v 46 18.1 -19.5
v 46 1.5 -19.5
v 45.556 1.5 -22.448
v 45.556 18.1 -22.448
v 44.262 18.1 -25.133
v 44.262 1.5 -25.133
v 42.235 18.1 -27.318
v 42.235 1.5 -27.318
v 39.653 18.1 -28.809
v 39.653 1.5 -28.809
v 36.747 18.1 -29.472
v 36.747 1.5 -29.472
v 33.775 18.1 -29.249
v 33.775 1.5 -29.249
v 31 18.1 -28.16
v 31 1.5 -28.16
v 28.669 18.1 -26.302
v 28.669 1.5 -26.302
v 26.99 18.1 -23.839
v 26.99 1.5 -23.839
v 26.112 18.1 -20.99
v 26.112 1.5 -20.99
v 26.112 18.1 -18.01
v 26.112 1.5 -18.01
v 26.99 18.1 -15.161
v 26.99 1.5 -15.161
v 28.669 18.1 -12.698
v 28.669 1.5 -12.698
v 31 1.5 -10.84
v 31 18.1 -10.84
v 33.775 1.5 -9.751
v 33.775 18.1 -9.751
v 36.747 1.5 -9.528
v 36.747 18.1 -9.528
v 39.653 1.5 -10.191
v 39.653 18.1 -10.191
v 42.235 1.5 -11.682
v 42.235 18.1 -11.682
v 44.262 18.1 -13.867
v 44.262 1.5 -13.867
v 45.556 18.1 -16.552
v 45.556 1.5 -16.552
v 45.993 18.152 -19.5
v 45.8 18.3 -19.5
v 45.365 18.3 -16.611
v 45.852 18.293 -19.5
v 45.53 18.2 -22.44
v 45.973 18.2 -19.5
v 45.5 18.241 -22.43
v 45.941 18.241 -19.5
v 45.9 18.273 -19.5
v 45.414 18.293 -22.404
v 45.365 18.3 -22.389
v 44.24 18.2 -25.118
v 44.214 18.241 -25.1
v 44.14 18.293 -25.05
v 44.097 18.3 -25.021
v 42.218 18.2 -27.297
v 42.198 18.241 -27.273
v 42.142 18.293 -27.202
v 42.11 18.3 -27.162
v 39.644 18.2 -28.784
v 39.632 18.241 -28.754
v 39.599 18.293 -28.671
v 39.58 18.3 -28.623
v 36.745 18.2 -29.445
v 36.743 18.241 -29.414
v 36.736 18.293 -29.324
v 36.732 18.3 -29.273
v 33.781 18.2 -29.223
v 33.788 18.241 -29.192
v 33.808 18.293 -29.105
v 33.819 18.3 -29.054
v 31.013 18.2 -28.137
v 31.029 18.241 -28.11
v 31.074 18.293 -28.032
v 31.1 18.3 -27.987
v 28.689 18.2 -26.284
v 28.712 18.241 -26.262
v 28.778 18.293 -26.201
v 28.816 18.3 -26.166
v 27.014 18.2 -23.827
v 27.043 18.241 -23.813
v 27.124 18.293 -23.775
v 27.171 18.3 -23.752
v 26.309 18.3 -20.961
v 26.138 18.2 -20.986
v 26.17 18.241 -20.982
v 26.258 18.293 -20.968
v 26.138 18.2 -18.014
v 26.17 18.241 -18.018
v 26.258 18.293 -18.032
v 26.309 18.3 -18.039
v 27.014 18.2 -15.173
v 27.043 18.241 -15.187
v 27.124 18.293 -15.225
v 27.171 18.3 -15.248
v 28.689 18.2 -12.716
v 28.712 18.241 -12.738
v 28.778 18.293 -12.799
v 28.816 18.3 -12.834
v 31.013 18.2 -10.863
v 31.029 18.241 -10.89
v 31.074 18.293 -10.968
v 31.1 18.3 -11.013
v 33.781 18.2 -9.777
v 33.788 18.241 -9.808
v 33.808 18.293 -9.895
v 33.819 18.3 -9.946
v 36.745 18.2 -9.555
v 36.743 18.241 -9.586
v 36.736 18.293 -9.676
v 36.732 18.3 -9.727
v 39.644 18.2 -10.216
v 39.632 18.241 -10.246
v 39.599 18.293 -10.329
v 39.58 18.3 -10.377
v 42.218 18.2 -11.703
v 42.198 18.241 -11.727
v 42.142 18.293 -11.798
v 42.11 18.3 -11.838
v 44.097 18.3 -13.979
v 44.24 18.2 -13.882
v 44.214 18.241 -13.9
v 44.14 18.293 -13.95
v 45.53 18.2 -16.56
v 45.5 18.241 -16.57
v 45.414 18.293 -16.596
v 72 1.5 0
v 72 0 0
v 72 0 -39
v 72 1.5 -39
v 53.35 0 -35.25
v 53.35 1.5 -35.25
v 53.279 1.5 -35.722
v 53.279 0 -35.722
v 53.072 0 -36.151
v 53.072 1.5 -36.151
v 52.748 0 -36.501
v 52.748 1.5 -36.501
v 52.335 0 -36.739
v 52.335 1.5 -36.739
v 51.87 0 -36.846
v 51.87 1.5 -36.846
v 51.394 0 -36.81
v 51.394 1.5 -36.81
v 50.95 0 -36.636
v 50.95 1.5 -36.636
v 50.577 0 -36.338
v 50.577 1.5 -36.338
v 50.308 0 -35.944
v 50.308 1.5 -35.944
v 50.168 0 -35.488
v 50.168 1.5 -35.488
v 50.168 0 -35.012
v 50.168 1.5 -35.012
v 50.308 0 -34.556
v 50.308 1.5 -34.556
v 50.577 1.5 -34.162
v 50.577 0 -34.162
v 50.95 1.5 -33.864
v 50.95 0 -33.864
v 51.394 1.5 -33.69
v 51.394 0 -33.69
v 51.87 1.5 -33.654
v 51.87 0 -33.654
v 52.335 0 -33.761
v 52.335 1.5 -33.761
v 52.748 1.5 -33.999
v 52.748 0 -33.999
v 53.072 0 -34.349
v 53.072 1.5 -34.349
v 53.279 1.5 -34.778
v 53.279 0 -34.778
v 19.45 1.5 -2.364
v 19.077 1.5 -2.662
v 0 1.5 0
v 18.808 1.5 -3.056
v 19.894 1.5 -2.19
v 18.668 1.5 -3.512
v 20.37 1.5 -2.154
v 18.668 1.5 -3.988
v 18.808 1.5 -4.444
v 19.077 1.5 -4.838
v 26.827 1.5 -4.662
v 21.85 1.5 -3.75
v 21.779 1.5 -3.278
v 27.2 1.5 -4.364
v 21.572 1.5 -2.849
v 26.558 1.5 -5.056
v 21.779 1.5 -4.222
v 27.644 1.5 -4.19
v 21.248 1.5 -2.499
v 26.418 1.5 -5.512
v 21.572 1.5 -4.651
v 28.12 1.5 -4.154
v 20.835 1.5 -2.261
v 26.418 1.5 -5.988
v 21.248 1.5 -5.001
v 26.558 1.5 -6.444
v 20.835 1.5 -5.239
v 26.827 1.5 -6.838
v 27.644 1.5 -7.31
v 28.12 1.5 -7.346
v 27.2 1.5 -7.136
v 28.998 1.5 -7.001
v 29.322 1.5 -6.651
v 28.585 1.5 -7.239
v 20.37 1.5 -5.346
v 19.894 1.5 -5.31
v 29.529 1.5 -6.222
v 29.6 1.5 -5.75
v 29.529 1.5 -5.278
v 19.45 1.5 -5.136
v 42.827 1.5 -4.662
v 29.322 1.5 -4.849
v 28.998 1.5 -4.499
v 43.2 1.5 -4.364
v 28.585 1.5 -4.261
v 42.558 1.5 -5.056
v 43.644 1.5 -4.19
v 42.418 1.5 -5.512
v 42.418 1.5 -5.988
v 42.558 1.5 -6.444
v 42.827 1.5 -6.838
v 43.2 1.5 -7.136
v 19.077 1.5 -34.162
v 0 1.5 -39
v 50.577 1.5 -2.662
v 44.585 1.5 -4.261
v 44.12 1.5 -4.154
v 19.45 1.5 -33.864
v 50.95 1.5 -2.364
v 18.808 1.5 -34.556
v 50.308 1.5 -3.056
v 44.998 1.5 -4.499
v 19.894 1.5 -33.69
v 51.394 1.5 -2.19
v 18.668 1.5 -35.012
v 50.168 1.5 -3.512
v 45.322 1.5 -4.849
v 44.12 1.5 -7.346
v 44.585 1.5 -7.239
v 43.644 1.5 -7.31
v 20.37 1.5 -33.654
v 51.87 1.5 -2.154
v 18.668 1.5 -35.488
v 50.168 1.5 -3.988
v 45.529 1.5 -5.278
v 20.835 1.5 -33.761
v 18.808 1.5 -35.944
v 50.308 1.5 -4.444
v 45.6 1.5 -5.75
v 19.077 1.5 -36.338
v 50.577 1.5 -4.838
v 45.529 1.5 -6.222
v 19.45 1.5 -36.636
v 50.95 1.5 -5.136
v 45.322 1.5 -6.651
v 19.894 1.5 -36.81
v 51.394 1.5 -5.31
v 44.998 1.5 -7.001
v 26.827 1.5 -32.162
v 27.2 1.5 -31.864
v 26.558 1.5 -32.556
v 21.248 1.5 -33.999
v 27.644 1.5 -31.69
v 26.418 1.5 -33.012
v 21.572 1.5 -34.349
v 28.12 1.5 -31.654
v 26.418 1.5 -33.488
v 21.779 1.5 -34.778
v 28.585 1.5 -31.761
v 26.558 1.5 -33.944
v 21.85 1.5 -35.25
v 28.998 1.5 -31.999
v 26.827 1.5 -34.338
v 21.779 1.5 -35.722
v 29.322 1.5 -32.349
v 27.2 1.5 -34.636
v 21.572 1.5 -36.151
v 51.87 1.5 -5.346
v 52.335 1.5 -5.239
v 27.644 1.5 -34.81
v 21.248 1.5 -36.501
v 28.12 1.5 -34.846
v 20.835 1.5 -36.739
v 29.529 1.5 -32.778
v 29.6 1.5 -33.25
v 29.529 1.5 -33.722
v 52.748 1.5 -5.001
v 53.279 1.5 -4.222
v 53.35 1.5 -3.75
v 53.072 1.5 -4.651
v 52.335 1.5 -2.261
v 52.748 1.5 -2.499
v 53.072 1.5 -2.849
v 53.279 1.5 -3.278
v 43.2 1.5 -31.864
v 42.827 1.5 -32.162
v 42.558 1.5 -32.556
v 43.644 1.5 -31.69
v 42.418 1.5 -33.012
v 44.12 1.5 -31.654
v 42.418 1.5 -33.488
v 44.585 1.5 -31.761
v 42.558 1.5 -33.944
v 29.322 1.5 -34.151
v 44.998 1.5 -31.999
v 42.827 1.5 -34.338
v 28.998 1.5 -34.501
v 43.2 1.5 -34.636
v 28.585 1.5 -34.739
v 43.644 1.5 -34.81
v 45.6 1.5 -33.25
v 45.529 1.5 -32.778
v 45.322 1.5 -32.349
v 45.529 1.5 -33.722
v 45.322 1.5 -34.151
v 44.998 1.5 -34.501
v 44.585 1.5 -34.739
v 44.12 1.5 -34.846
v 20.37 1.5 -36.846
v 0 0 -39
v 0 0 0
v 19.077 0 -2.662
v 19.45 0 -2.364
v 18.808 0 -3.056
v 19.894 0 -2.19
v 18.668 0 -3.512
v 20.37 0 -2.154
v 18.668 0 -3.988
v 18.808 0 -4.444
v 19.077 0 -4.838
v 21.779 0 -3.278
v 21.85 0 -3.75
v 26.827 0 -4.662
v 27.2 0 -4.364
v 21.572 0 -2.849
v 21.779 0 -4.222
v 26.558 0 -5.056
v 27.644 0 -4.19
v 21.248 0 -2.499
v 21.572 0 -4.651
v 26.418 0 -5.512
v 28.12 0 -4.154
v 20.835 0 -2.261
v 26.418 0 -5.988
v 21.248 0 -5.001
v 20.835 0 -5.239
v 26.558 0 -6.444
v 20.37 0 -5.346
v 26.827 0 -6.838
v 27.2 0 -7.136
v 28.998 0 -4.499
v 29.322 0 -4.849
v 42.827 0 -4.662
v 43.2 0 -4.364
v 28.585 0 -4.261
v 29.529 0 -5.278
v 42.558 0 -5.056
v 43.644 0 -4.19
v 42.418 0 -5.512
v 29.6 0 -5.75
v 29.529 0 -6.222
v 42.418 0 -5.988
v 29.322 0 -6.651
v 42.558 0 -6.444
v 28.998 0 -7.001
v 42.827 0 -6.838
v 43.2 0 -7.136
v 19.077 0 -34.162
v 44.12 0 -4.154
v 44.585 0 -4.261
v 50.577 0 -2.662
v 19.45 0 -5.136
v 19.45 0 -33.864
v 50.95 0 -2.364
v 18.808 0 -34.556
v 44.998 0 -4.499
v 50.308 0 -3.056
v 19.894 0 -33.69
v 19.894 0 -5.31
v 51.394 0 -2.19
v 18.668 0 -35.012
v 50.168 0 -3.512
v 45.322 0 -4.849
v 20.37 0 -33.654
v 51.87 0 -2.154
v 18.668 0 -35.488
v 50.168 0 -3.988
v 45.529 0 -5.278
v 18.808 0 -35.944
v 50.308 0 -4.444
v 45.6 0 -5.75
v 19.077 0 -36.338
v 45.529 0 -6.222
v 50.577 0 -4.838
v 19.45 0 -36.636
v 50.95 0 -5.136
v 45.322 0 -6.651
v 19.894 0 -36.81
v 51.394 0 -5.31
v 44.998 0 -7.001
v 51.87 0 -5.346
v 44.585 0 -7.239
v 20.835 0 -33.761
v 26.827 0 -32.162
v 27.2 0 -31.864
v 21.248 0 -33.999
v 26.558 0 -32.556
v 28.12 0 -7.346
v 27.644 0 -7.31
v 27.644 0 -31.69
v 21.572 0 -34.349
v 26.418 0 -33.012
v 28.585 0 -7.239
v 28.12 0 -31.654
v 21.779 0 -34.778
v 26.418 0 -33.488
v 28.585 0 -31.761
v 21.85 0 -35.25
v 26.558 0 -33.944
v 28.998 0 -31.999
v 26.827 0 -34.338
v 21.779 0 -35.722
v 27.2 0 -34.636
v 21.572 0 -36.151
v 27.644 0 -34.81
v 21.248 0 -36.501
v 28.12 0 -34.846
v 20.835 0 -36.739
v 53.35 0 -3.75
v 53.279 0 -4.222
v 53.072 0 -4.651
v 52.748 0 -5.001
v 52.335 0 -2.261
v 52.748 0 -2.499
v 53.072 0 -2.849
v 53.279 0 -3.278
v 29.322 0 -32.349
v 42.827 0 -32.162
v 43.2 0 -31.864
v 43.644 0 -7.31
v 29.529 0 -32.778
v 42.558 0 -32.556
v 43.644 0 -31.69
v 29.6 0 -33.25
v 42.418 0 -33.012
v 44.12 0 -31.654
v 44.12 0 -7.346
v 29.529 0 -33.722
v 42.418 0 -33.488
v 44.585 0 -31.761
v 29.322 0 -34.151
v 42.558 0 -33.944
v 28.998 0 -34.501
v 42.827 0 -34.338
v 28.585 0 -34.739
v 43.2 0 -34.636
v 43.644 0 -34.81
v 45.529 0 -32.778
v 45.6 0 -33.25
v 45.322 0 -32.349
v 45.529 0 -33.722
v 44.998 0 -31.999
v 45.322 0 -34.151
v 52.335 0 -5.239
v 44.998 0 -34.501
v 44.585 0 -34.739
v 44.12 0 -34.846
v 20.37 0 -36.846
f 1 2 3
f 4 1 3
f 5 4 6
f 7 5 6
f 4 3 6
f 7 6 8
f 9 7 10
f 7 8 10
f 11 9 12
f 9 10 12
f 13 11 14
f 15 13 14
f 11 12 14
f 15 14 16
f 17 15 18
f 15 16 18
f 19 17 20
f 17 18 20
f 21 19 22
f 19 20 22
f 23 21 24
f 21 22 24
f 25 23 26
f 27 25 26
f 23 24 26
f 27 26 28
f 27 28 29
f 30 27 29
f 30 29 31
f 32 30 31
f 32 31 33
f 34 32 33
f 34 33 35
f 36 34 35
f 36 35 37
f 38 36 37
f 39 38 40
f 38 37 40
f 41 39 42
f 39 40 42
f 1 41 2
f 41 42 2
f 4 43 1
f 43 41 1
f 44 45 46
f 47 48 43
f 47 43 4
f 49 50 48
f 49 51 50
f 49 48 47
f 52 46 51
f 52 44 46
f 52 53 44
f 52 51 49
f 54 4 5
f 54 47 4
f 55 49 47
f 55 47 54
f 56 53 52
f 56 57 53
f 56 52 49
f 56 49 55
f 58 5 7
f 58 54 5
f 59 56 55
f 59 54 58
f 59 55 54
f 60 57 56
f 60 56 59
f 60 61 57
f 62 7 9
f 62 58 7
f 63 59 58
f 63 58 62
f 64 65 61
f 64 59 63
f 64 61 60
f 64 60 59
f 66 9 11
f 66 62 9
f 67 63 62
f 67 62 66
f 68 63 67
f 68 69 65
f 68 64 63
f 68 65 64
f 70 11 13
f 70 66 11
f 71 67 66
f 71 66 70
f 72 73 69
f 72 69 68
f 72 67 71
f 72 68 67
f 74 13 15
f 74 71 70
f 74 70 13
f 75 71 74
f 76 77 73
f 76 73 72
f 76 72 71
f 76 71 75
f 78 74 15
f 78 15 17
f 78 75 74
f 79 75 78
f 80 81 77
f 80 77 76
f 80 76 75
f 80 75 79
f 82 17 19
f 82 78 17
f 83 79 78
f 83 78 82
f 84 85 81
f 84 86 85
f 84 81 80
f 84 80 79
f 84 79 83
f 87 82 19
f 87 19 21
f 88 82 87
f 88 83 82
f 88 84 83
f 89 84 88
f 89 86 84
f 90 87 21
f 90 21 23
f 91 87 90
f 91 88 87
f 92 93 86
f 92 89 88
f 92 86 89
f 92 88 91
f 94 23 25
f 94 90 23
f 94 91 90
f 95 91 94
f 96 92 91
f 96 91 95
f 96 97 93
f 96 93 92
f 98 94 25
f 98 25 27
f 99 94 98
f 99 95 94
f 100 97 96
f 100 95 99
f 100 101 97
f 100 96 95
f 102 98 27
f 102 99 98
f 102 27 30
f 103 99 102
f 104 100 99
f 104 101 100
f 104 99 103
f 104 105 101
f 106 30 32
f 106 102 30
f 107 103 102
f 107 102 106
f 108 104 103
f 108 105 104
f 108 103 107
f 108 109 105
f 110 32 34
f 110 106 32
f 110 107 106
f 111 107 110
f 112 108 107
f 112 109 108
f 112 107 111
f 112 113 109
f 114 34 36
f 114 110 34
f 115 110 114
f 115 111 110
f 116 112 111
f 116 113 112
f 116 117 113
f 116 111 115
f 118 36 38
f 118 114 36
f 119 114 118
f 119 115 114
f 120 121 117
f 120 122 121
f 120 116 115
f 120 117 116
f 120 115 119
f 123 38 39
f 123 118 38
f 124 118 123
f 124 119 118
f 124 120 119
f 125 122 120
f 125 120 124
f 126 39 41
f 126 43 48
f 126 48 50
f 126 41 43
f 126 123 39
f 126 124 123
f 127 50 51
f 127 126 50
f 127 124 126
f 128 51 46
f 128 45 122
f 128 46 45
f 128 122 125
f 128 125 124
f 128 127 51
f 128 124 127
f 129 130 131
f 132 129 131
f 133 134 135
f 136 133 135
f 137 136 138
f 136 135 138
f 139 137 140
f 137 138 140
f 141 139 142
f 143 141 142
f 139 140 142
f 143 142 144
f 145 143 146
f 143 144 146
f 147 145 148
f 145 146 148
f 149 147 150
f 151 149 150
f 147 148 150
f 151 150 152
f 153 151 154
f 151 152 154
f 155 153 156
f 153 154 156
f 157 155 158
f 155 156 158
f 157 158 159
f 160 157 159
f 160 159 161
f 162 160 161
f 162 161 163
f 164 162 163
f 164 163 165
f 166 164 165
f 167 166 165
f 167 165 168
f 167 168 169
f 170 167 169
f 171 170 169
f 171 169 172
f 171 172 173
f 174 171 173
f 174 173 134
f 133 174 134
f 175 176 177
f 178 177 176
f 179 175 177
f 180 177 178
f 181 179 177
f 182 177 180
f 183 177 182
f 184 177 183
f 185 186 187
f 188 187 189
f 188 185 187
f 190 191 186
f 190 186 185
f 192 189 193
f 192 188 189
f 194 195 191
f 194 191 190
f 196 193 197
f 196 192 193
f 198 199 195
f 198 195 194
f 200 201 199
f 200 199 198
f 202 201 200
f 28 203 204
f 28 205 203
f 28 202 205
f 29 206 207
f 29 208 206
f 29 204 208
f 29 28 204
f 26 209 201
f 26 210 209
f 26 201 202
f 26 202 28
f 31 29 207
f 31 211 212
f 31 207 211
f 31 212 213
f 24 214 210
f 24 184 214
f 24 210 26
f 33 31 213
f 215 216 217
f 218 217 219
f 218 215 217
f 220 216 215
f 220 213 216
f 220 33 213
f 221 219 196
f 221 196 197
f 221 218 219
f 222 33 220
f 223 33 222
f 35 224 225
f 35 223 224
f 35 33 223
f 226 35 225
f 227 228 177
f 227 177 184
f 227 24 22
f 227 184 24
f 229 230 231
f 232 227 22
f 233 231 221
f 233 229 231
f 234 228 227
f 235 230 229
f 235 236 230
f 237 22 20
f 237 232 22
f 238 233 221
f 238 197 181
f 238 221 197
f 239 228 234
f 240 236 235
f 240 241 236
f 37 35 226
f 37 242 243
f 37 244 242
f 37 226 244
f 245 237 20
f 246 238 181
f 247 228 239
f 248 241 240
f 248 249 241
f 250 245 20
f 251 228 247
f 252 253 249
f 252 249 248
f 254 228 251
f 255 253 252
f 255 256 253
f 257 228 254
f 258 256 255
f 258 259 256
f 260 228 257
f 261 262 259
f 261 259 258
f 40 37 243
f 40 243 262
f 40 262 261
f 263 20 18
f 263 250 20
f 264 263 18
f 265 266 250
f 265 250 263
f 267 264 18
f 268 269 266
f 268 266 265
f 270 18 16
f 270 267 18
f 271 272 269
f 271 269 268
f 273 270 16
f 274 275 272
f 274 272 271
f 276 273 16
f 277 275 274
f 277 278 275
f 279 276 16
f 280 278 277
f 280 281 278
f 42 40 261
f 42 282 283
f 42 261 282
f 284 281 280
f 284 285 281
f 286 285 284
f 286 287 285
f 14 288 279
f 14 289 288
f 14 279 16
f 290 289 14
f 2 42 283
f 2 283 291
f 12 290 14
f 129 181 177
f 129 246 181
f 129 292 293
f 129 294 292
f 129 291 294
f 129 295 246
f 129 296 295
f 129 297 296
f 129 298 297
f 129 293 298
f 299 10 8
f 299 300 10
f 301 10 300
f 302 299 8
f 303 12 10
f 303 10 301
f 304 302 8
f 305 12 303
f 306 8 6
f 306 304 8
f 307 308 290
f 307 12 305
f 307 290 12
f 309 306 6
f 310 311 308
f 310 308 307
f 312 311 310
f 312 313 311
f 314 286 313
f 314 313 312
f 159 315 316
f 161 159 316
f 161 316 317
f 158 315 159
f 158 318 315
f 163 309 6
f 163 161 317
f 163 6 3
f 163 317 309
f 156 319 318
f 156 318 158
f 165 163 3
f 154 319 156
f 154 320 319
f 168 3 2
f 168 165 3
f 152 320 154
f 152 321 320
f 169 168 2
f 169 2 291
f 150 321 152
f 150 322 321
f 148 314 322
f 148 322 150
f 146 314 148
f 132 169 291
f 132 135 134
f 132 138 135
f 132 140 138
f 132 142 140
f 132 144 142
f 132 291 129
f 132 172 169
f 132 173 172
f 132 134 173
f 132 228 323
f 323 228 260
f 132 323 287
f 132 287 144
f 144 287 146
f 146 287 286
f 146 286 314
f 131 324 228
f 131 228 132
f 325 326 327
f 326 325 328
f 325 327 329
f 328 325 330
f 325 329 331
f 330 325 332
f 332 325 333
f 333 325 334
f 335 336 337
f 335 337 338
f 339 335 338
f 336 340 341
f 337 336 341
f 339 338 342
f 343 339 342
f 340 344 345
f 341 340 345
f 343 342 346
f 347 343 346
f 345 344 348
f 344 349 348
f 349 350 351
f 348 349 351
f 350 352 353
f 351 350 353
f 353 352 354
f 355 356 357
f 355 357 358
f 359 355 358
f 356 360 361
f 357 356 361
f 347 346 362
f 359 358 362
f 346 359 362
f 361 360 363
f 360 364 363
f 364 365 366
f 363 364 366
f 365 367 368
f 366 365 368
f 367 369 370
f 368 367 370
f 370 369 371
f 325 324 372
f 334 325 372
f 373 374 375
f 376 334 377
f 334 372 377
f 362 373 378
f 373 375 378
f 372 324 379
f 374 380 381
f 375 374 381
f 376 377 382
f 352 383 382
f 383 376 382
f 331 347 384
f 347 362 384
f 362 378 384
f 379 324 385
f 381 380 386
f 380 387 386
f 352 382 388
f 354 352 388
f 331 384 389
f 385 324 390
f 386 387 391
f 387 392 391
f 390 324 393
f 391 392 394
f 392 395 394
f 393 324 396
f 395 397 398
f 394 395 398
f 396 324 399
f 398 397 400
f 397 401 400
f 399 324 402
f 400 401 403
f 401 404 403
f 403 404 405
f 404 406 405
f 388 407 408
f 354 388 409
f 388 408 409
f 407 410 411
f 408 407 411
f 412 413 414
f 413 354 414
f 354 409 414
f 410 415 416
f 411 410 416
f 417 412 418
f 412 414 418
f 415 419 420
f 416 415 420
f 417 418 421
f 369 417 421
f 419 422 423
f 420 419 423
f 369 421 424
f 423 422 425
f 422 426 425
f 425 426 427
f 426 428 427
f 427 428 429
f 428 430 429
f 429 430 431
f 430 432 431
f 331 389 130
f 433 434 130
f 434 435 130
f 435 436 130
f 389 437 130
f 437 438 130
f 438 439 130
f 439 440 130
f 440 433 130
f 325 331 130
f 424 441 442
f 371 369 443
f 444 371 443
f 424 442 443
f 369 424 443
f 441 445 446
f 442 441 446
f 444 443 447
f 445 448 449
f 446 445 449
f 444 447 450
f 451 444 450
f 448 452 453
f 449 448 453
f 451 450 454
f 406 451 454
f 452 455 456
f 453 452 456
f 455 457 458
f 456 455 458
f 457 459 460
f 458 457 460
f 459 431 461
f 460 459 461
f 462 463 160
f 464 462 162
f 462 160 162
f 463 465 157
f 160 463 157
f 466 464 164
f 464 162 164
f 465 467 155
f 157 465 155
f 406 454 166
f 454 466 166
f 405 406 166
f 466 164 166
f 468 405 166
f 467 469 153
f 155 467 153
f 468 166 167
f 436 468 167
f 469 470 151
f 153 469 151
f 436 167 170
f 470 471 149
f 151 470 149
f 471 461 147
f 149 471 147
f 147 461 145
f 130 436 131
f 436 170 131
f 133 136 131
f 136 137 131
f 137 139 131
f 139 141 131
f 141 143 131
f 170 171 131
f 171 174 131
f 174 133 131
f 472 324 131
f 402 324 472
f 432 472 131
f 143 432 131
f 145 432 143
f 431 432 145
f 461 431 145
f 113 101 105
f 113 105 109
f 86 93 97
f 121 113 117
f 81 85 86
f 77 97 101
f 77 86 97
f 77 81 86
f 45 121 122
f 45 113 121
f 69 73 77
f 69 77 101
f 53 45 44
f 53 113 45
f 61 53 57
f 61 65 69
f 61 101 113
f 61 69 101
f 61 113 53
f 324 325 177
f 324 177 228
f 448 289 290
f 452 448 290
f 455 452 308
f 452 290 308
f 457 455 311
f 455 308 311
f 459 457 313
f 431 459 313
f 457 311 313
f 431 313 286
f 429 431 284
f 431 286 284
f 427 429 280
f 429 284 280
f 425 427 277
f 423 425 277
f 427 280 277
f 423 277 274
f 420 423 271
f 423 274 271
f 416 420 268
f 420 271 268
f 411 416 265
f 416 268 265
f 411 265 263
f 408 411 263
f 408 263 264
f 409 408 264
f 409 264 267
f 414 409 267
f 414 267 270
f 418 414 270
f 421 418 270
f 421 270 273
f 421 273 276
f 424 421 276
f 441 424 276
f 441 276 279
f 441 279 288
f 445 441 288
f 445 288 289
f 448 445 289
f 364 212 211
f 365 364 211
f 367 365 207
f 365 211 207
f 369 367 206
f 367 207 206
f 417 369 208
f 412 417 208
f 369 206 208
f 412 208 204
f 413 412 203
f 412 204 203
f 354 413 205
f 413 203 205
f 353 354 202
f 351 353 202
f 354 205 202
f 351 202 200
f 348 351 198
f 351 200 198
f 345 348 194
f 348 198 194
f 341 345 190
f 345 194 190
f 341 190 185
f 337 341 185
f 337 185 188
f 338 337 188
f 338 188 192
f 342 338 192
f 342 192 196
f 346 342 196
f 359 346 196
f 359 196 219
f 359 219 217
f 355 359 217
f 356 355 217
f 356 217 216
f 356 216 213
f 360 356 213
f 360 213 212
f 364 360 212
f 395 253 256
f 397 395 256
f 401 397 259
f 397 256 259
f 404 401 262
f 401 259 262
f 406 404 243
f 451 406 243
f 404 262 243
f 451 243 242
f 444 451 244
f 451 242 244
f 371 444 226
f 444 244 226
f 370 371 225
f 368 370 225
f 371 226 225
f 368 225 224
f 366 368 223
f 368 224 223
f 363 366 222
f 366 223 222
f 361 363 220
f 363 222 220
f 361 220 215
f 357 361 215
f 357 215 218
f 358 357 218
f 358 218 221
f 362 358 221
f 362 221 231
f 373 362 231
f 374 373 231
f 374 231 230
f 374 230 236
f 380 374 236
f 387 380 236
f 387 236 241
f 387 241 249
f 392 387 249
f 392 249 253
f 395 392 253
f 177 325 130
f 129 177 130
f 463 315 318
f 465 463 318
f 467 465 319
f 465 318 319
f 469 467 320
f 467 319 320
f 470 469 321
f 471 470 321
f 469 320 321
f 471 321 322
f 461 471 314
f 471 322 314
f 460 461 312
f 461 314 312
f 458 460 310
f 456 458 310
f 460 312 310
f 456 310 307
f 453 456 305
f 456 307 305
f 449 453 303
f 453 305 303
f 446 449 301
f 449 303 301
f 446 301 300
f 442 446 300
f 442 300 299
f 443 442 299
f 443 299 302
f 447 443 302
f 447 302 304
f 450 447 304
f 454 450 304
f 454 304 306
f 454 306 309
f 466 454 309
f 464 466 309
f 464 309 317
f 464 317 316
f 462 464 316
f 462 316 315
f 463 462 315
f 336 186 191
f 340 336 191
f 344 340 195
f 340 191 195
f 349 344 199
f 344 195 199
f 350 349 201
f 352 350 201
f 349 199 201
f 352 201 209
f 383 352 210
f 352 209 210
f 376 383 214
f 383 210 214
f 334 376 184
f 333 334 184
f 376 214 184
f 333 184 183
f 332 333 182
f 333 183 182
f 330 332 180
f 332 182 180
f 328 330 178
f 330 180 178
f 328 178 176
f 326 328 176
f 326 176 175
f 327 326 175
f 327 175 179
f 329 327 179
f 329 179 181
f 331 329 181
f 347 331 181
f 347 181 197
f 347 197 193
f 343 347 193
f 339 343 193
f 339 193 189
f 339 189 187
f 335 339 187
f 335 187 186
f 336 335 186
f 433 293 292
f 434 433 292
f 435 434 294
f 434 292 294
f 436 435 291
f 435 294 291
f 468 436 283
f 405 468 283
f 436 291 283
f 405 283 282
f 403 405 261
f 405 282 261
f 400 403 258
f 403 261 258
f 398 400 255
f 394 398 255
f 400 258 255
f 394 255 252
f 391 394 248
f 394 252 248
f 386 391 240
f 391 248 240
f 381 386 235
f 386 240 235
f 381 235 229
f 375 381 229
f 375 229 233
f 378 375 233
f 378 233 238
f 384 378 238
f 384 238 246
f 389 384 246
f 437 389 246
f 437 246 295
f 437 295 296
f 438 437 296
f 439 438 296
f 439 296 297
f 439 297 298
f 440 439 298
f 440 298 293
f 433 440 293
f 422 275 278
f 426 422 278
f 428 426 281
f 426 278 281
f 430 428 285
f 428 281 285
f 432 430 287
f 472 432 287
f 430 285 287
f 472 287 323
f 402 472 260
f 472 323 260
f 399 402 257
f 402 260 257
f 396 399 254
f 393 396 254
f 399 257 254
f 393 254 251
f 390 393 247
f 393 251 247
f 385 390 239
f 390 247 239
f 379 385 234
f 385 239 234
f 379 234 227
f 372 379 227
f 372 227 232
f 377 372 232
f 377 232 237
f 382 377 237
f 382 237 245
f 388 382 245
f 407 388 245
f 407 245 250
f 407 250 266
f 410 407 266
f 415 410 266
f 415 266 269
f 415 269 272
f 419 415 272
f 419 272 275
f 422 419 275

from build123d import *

# Parameters (mm, degrees)
SKETCH1_W           = 72
SKETCH1_H           = 39
BOSS_EXTRUDE1_DEPTH = 1.5
SKETCH2_R           = 10
BOSS_EXTRUDE2_DEPTH = 16.8
SKETCH3_R           = 1.6
CUT_EXTRUDE1_DEPTH  = 16.8
SKETCH4_R           = 1.6
CUT_EXTRUDE2_DEPTH  = 16.8
FILLET1_R           = 0.2


with BuildPart() as part:
    # Sketch1 → Boss-Extrude1 (new body)
    with BuildSketch(Plane(origin=(0, 0, 0), x_dir=(1, 0, 0), z_dir=(0, 1, 0))):
        with Locations((36, 19.5)):
            Rectangle(SKETCH1_W, SKETCH1_H)
    extrude(amount=BOSS_EXTRUDE1_DEPTH)

    # Sketch2 → Boss-Extrude2 (add)
    with BuildSketch(Plane(origin=(0, 1.5, 0), x_dir=(1, 0, 0), z_dir=(0, 1, 0))):
        with Locations((36, 19.5)):
            Circle(SKETCH2_R)
    extrude(amount=BOSS_EXTRUDE2_DEPTH)

    # Sketch3 → Cut-Extrude1 (cut)
    with BuildSketch(Plane(origin=(0, 1.5, 0), x_dir=(1, 0, 0), z_dir=(0, 1, 0))):
        with Locations((44, 5.75)):
            Circle(SKETCH3_R)
        with Locations((28, 5.75)):
            Circle(SKETCH3_R)
        with Locations((28, 33.25)):
            Circle(SKETCH3_R)
        with Locations((44, 33.25)):
            Circle(SKETCH3_R)
    extrude(amount=-CUT_EXTRUDE1_DEPTH, mode=Mode.SUBTRACT)

    # Sketch4 → Cut-Extrude2 (cut)
    with BuildSketch(Plane(origin=(0, 1.5, 0), x_dir=(1, 0, 0), z_dir=(0, 1, 0))):
        with Locations((51.75, 3.75)):
            Circle(SKETCH4_R)
        with Locations((51.75, 35.25)):
            Circle(SKETCH4_R)
        with Locations((20.25, 3.75)):
            Circle(SKETCH4_R)
        with Locations((20.25, 35.25)):
            Circle(SKETCH4_R)
    extrude(amount=-CUT_EXTRUDE2_DEPTH, mode=Mode.SUBTRACT)

    # Fillet1
    fillet1_edges = [part.edges().sort_by_distance(p)[0] for p in [
        (26, 18.3, -19.5),
    ]]
    fillet(fillet1_edges, radius=FILLET1_R)


solid = part.part
